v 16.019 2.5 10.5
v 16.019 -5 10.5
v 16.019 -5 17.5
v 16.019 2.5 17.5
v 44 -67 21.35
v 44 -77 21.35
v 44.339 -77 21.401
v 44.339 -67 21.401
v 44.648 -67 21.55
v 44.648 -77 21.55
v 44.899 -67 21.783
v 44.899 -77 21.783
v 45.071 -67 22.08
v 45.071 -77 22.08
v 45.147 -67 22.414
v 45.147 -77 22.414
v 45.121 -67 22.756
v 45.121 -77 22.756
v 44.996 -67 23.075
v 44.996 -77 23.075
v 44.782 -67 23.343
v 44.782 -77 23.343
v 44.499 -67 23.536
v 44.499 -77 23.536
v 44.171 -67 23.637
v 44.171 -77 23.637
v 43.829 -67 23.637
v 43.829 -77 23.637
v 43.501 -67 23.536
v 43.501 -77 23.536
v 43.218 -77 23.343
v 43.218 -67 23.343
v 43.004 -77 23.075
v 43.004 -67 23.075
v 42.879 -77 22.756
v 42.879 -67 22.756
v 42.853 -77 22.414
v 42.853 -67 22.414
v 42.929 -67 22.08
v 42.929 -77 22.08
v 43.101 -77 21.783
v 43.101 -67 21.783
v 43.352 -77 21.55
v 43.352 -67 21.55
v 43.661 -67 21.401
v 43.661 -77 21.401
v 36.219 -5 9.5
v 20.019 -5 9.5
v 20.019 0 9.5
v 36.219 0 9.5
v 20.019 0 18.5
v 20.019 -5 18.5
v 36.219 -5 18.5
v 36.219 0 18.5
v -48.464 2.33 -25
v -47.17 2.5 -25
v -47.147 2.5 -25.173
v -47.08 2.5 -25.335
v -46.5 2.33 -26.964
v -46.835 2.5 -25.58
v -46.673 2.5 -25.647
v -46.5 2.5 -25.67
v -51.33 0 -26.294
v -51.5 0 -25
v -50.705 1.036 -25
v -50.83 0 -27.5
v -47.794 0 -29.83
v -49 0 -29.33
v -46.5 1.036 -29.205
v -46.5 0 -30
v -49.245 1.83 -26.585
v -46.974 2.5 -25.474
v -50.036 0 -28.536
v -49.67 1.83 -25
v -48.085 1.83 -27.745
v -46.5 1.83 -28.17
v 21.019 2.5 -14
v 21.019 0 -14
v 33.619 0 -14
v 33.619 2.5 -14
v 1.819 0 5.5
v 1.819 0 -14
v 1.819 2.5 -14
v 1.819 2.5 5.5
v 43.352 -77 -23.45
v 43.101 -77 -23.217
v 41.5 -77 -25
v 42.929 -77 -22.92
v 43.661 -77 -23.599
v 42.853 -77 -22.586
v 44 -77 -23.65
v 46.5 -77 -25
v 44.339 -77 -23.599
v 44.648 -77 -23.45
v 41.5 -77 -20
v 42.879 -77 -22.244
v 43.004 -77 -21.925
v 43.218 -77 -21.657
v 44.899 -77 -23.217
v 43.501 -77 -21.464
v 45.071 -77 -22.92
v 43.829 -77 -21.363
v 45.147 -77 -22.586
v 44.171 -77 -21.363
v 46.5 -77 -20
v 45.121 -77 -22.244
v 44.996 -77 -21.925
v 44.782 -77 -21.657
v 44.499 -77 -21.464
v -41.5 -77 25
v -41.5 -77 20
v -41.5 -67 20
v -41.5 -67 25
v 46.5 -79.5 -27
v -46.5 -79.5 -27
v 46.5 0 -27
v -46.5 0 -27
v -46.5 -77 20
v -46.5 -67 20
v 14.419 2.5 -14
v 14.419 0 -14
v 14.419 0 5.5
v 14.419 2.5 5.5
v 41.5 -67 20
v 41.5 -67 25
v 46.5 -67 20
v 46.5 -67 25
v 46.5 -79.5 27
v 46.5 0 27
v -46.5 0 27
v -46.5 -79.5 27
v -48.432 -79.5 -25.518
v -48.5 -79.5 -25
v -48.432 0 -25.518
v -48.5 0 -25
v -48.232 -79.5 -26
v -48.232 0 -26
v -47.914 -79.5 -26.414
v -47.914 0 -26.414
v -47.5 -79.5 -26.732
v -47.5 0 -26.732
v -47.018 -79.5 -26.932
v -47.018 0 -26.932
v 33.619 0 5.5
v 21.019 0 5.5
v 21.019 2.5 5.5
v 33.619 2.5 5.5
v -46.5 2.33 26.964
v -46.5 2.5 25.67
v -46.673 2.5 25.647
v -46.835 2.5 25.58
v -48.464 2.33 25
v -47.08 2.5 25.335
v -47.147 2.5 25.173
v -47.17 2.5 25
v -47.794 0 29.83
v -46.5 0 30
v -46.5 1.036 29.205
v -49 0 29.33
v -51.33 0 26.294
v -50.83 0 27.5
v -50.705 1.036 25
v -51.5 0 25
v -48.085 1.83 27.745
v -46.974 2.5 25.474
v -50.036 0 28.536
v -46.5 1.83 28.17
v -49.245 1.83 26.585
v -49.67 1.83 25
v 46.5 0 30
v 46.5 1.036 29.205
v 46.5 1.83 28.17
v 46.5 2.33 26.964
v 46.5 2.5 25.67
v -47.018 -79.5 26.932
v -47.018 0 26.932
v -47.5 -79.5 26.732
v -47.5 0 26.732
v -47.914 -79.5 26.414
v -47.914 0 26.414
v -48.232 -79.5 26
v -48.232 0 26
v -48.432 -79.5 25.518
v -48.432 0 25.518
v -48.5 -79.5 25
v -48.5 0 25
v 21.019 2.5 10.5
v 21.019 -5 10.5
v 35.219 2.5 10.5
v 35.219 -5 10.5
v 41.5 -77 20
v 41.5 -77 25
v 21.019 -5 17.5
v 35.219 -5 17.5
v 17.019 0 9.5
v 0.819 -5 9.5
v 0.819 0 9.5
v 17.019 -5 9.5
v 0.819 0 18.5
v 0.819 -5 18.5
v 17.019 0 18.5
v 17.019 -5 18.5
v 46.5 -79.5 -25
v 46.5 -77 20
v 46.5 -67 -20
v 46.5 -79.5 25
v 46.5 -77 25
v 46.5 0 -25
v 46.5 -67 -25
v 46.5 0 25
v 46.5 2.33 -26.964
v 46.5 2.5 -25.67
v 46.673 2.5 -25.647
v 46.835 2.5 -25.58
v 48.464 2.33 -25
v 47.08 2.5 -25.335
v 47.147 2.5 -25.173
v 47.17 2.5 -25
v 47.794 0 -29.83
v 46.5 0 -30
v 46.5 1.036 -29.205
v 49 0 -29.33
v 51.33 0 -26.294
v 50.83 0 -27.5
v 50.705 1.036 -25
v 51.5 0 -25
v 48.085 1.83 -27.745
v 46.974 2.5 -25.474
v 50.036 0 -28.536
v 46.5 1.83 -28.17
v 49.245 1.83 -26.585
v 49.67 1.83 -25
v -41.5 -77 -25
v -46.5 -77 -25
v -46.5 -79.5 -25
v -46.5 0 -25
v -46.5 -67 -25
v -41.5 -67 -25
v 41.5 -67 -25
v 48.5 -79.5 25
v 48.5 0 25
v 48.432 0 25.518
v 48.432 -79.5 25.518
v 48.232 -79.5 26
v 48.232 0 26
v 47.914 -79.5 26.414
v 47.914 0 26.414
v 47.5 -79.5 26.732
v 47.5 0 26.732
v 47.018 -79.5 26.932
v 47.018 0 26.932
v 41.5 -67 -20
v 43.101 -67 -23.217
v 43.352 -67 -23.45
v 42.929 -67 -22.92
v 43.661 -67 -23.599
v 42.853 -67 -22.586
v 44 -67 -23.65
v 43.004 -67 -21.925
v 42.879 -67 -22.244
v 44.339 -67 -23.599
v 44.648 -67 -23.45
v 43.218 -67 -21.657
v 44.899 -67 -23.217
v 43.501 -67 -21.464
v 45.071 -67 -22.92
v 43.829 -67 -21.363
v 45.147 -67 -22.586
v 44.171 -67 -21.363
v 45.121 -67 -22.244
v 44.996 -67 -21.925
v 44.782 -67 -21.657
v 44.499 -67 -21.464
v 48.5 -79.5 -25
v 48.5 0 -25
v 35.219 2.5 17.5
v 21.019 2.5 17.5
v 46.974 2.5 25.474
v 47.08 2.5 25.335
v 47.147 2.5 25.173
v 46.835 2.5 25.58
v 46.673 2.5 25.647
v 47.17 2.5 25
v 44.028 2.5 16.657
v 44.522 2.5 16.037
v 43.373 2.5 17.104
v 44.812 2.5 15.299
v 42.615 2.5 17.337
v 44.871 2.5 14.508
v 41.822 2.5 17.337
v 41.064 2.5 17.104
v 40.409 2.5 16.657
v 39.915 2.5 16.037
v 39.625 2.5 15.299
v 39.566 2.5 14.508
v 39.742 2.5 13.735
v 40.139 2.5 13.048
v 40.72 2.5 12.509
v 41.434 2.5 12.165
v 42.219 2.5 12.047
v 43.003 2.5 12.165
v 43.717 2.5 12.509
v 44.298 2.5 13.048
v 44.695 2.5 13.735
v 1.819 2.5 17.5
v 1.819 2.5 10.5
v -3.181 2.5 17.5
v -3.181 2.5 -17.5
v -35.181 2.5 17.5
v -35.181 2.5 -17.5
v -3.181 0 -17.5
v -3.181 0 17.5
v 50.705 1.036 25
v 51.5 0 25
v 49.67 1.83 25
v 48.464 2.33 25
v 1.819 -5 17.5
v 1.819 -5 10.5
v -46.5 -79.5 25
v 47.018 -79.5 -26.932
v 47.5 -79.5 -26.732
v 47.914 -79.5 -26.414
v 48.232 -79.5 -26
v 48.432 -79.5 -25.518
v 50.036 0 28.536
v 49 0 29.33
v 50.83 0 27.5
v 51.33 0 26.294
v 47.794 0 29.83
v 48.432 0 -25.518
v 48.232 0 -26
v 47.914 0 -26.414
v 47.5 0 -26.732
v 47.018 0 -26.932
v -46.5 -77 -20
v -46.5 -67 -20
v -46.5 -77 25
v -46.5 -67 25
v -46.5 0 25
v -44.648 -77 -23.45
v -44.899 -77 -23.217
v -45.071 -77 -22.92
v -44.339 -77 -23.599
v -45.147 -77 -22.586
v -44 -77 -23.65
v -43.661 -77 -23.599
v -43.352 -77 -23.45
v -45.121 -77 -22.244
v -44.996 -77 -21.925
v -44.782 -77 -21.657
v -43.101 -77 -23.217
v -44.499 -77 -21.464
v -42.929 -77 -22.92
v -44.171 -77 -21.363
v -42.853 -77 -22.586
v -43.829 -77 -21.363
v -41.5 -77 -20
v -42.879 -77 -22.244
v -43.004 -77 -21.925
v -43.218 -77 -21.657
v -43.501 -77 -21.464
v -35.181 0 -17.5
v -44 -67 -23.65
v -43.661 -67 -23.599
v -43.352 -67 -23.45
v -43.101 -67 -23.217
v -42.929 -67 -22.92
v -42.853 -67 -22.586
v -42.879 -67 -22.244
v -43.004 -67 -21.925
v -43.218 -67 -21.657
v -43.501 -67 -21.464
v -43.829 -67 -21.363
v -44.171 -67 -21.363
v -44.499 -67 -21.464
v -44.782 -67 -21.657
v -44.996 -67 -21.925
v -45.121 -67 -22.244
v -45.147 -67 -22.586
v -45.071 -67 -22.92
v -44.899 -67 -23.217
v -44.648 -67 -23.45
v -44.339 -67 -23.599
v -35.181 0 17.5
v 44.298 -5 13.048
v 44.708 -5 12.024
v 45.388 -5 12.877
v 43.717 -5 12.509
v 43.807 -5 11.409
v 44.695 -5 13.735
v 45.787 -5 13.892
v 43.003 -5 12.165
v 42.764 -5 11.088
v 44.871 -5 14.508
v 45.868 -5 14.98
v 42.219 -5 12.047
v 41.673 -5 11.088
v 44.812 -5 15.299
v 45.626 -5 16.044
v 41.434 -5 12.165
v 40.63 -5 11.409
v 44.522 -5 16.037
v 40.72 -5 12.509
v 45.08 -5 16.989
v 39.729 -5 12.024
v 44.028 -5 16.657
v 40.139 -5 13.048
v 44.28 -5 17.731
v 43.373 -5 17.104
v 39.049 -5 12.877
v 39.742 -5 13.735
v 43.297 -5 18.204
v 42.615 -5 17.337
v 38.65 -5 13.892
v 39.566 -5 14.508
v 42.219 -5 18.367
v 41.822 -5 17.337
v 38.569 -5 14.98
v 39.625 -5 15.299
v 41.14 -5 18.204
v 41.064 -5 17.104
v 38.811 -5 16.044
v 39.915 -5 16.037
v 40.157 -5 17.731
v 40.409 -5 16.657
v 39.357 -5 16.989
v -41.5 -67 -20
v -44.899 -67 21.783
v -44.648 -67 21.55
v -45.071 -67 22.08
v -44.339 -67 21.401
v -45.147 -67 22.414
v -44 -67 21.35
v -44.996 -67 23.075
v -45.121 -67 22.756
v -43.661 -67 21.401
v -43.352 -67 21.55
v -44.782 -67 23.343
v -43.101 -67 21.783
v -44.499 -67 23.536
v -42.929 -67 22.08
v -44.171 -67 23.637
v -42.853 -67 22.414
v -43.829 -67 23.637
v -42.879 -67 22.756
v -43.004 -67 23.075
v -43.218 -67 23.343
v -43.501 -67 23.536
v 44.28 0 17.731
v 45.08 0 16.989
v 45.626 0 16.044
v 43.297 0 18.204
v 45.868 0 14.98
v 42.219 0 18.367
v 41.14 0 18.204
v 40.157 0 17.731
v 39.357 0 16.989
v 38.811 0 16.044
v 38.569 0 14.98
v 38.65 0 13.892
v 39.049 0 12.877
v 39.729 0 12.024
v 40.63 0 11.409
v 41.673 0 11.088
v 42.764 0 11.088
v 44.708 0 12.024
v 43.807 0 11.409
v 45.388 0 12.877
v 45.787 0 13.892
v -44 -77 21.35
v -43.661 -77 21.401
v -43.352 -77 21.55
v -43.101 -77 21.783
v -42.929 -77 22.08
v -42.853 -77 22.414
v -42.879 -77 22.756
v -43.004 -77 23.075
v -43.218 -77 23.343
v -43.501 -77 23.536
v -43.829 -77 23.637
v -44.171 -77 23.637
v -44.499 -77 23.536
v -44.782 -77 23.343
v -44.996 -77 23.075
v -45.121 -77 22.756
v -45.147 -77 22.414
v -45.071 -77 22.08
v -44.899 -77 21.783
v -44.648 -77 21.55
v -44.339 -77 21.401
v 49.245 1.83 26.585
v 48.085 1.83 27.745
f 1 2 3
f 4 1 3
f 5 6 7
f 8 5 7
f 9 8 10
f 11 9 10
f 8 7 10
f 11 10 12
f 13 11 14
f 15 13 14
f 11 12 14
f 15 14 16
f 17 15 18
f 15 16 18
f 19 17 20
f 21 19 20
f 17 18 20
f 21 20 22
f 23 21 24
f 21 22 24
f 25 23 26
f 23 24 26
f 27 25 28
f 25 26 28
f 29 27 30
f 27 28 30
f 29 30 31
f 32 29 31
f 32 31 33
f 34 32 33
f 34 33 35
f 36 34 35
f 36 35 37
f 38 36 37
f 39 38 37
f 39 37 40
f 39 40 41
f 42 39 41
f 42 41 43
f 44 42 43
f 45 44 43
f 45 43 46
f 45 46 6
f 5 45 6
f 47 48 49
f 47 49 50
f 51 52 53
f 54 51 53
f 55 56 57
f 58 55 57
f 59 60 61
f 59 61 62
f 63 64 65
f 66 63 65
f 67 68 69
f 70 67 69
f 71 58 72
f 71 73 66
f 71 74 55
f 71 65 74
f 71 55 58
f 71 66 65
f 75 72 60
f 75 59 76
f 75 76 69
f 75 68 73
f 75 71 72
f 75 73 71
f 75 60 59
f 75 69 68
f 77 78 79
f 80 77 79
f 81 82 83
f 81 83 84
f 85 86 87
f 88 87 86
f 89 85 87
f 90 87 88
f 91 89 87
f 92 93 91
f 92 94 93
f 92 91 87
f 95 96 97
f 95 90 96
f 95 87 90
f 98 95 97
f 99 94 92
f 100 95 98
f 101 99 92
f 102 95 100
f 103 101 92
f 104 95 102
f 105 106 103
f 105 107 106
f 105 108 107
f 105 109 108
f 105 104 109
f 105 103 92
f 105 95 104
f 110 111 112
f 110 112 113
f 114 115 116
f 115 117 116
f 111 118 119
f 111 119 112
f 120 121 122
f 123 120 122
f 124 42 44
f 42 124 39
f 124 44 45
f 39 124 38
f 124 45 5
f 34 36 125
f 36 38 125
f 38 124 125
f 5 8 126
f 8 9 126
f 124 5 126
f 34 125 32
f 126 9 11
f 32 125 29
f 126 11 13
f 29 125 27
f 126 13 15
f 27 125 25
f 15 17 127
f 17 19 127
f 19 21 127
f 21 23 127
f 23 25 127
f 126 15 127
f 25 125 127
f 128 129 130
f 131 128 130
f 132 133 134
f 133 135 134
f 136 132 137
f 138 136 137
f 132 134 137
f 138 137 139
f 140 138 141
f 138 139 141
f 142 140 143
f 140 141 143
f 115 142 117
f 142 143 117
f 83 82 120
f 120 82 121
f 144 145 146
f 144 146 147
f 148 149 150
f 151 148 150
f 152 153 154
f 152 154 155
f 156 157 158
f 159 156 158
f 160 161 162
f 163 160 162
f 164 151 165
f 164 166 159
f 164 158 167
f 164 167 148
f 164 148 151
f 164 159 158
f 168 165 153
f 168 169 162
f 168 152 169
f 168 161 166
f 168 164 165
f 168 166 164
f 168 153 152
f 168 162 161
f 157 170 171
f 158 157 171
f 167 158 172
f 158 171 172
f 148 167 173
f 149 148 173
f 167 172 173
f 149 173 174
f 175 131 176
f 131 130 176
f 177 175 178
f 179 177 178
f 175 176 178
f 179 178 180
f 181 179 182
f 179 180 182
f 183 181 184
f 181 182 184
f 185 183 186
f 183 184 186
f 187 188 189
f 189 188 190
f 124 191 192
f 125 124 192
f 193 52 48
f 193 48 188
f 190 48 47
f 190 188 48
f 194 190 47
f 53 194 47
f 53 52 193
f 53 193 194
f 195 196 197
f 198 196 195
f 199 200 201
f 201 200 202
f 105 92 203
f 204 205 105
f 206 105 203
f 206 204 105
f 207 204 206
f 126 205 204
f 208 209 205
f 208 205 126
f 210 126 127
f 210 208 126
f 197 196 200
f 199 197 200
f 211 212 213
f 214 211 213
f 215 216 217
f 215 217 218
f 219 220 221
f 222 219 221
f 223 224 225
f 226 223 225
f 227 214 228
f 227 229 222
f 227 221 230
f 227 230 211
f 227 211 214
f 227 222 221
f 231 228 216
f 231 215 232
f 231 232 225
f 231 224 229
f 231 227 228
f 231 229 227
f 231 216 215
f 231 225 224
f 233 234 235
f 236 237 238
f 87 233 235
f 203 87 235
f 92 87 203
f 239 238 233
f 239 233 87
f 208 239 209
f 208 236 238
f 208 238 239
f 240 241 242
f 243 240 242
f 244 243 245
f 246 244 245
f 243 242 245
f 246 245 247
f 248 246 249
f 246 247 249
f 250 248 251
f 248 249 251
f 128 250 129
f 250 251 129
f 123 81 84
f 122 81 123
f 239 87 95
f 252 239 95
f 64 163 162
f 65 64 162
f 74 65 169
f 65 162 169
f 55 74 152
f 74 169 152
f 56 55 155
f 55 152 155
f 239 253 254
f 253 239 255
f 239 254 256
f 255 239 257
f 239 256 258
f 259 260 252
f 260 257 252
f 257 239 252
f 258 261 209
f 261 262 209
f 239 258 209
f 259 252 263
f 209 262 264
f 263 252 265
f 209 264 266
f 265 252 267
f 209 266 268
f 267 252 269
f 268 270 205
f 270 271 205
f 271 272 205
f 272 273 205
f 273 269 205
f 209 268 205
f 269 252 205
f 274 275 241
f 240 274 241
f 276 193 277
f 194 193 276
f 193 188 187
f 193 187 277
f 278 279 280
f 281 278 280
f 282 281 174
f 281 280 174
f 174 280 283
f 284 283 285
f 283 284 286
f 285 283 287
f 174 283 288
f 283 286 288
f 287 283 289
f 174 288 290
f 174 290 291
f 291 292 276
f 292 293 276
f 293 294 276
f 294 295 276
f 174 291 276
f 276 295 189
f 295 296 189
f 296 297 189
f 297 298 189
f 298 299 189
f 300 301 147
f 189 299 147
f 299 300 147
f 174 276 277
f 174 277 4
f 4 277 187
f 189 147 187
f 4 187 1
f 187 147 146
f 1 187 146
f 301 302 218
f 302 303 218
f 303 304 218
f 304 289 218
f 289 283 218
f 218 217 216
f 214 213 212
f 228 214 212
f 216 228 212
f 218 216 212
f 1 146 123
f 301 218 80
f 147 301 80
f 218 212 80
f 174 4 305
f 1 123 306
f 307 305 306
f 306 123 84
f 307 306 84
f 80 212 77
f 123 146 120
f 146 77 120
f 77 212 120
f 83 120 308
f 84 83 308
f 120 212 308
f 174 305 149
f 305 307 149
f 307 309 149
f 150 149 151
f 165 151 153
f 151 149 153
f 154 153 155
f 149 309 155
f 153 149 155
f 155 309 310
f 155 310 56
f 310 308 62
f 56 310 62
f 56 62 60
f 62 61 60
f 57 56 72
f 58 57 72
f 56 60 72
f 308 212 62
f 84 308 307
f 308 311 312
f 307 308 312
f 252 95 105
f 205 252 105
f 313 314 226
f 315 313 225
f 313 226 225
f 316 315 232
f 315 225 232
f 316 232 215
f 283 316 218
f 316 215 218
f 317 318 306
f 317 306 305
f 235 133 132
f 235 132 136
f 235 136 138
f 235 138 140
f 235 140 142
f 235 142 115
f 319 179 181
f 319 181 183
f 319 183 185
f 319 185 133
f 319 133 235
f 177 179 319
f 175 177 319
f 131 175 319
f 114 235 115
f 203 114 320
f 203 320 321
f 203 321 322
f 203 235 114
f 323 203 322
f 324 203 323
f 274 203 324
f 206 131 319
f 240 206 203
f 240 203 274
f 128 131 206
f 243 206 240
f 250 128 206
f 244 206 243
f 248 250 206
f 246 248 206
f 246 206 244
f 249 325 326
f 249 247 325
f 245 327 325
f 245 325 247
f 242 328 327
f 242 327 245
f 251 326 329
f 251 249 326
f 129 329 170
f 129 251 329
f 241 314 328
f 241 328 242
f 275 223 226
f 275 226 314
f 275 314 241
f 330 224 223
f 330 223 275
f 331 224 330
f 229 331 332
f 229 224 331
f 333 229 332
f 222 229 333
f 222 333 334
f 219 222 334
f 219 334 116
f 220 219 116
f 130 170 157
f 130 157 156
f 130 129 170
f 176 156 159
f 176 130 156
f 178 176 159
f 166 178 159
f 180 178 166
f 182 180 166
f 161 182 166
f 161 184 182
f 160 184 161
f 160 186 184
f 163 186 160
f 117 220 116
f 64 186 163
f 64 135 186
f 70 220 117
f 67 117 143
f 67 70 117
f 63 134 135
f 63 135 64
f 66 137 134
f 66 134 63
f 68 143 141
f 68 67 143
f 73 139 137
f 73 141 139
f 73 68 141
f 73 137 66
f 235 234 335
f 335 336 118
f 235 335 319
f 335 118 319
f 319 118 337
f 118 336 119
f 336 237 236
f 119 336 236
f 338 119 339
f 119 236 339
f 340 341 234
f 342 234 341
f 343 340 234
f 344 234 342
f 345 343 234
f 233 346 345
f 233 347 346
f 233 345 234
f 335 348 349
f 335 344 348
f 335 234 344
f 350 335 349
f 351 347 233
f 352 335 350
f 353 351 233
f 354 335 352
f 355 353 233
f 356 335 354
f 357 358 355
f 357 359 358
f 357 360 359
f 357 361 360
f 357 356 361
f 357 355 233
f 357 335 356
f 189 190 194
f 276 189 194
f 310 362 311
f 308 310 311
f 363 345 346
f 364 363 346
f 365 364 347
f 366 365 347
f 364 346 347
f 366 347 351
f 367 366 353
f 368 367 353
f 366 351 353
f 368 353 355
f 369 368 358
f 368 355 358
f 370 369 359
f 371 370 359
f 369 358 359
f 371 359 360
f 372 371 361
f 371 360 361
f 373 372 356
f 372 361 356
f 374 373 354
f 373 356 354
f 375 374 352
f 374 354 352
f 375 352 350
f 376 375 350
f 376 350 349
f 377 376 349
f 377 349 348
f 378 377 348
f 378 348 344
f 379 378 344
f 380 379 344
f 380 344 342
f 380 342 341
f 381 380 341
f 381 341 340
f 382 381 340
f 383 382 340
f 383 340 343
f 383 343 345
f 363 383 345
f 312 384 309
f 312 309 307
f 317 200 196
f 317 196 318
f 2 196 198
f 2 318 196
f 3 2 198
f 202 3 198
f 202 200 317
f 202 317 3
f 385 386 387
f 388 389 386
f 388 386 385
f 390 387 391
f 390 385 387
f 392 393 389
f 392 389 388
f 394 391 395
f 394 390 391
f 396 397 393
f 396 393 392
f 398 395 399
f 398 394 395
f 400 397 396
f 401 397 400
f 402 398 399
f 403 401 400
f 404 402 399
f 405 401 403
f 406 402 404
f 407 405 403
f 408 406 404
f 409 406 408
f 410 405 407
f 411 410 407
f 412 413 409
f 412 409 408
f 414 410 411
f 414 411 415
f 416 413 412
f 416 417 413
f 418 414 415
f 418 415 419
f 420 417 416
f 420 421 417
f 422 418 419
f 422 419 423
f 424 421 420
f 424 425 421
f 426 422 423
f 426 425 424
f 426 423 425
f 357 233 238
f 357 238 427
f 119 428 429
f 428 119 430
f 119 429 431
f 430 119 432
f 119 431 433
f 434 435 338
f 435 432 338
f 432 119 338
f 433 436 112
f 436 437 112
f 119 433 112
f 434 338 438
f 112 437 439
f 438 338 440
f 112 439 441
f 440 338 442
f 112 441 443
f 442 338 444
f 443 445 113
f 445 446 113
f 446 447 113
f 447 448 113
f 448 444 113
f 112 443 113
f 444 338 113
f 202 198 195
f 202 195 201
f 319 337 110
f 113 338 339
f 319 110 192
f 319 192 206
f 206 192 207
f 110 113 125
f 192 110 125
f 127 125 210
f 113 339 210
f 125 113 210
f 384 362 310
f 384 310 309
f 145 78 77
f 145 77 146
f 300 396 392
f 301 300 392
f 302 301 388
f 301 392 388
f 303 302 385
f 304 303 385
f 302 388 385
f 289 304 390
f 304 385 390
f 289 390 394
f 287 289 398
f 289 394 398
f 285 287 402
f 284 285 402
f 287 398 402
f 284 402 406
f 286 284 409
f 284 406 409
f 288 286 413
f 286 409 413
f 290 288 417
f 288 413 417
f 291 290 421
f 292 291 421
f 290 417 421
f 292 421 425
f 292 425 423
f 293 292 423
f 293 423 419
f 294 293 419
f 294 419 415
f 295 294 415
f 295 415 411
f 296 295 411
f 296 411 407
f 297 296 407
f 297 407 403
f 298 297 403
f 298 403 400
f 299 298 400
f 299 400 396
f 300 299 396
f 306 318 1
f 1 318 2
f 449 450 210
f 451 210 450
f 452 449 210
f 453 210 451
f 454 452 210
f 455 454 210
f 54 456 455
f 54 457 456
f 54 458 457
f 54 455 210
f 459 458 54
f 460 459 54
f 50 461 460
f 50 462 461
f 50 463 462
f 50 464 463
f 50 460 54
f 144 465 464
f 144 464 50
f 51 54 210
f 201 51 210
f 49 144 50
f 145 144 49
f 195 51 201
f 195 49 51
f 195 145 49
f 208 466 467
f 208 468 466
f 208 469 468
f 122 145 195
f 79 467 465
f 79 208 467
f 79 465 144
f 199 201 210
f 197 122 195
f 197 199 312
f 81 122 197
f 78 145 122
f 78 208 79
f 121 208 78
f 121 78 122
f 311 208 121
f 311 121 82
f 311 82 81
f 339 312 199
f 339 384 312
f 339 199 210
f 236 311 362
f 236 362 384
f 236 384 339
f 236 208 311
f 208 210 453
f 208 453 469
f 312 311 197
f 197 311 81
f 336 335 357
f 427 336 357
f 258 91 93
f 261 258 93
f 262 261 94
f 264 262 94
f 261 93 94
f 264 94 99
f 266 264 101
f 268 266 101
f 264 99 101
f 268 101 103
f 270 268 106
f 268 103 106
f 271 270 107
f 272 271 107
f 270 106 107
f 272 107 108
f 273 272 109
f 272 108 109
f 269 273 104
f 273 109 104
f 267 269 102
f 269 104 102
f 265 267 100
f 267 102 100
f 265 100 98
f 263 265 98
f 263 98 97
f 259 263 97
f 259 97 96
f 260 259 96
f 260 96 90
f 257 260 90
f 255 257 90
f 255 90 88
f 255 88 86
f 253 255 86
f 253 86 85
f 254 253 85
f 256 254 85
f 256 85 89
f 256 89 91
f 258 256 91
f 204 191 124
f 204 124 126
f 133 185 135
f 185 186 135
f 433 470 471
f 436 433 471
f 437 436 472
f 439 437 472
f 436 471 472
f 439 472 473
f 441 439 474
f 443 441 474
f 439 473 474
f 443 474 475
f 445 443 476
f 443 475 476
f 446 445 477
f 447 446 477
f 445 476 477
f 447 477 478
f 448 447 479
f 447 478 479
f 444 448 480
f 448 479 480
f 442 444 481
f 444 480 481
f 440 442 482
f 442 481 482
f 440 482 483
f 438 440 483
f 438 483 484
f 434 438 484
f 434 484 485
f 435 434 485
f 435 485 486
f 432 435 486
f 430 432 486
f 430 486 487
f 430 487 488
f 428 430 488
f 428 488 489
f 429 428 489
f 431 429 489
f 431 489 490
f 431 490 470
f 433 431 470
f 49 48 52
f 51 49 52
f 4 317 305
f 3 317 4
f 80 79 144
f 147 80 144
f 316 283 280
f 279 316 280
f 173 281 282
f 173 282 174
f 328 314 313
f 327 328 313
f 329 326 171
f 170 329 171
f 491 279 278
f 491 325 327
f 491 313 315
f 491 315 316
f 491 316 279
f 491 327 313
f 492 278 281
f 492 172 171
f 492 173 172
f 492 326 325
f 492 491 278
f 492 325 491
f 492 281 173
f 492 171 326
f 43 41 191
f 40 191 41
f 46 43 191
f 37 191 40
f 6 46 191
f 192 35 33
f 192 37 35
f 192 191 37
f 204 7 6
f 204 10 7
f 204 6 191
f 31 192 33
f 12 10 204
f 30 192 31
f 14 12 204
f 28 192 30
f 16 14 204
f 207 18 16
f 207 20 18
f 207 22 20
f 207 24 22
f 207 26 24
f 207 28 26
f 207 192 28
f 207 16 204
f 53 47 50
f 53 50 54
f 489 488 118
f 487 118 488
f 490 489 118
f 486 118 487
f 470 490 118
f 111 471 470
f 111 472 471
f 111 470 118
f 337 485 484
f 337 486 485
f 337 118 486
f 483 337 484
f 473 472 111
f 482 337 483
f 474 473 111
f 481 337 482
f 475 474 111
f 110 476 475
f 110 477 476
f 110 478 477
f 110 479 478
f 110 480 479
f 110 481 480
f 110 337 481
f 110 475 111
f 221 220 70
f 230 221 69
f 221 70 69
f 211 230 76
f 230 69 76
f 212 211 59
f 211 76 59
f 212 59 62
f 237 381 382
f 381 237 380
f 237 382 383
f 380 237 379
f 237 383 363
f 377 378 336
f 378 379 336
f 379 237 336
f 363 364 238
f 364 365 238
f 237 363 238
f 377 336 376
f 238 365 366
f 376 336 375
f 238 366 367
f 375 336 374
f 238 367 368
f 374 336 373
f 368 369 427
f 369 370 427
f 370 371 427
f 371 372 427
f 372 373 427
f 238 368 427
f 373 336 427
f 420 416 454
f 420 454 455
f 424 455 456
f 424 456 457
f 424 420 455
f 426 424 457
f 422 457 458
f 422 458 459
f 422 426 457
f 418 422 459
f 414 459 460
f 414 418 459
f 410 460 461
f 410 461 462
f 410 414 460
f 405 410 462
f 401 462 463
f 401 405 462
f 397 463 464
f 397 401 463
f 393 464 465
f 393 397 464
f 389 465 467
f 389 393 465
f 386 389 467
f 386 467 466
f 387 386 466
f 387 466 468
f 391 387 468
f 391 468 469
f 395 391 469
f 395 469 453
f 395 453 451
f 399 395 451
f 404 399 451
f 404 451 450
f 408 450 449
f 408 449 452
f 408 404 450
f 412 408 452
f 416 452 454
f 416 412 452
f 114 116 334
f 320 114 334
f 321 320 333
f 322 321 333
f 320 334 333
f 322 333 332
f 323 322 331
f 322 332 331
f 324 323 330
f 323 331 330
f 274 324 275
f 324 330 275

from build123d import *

# Parameters (mm, degrees)
BOSS_EXTRUDE1_DEPTH = 2.5
FILLET1_R           = 5
SKETCH2_W           = 93
SKETCH2_H           = 50
BOSS_EXTRUDE2_DEPTH = 77
SKETCH8_R           = 2.660141884
SKETCH8_W           = 32
SKETCH8_H           = 35
SKETCH8_W_2         = 14.2
SKETCH8_H_2         = 7
SKETCH8_W_3         = 12.6
SKETCH8_H_3         = 19.5
CUT_EXTRUDE3_DEPTH  = 10
BOSS_EXTRUDE4_START = 5
SKETCH9_R           = 3.660141884
SKETCH9_R_2         = 2.660141884
SKETCH9_W           = 16.2
SKETCH9_H           = 9
SKETCH9_W_2         = 14.2
SKETCH9_H_2         = 7
BOSS_EXTRUDE4_DEPTH = 5
SKETCH10_W          = 5
SKETCH10_H          = 5
BOSS_EXTRUDE5_DEPTH = 10
SKETCH11_W          = 93
SKETCH11_H          = 50
BOSS_EXTRUDE6_DEPTH = 2.5
CUT_EXTRUDE4_REACH  = 101.36
SKETCH12_R          = 1.15


with BuildPart() as part:
    # Sketch1 → Boss-Extrude1 (new body)
    with BuildSketch(Plane(origin=(0, 0, 0), x_dir=(1, 0, 0), z_dir=(0, 1, 0))):
        with BuildLine():
            Line((-46.5, 30), (46.5, 30))
            ThreePointArc((46.5, 30), (50.035533906, 28.535533906), (51.5, 25))
            Line((51.5, 25), (51.5, -25))
            ThreePointArc((51.5, -25), (50.035533906, -28.535533906), (46.5, -30))
            Line((46.5, -30), (-46.5, -30))
            ThreePointArc((-46.5, -30), (-50.035533906, -28.535533906), (-51.5, -25))
            Line((-51.5, -25), (-51.5, 25))
            ThreePointArc((-51.5, 25), (-50.035533906, 28.535533906), (-46.5, 30))
        make_face()
    extrude(amount=BOSS_EXTRUDE1_DEPTH)

    # Fillet1
    # the kernel refuses this fillet: 5 mm, written as the material it takes off along each edge
    with BuildSketch(Plane(origin=(-46.5, 2.5, -25), x_dir=(-1, 0, 0), z_dir=(0, 0, 1))) as fillet1_piece_1:
        with BuildLine():
            CenterArc((0.669872981, 5), FILLET1_R, 270, 60)
            Line((0.669872981, 0), (0.669872981, -0.1))
            Line((0.669872981, -0.1), (5, -0.1))
            Line((5, -0.1), (5.1, 0))
            ThreePointArc((5.1, 0), (5.1, 1.25), (5.08660254, 2.45))
            Line((5.08660254, 2.45), (5, 2.5))
        make_face()
    revolve(axis=Axis((-46.5, 2.5, -25), (0, -1, 0)), revolution_arc=90, mode=Mode.SUBTRACT)
    with BuildSketch(Plane(origin=(-46.5, 2.5, -30), x_dir=(0, -1, 0), z_dir=(1, 0, 0)), Plane(origin=(46.5, 2.5, 30), x_dir=(0, -1, 0), z_dir=(-1, 0, 0))) as fillet1_piece_2:
        with BuildLine():
            CenterArc((5, -4.330127019), FILLET1_R, 120, 60)
            Line((0, -4.330127019), (-0.1, -4.330127019))
            Line((-0.1, -4.330127019), (-0.1, 0))
            Line((-0.1, 0), (0, 0.1))
            ThreePointArc((0, 0.1), (1.25, 0.1), (2.45, 0.08660254))
            Line((2.45, 0.08660254), (2.5, 0))
        make_face()
    extrude(amount=93, mode=Mode.SUBTRACT)
    with BuildSketch(Plane(origin=(46.5, 2.5, -25), x_dir=(0, 0, -1), z_dir=(-1, 0, 0))) as fillet1_piece_3:
        with BuildLine():
            CenterArc((0.669872981, 5), FILLET1_R, 270, 60)
            Line((0.669872981, 0), (0.669872981, -0.1))
            Line((0.669872981, -0.1), (5, -0.1))
            Line((5, -0.1), (5.1, 0))
            ThreePointArc((5.1, 0), (5.1, 1.25), (5.08660254, 2.45))
            Line((5.08660254, 2.45), (5, 2.5))
        make_face()
    revolve(axis=Axis((46.5, 2.5, -25), (0, -1, 0)), revolution_arc=90, mode=Mode.SUBTRACT)
    with BuildSketch(Plane(origin=(51.5, 2.5, -25), x_dir=(0, -1, 0), z_dir=(0, 0, 1)), Plane(origin=(-51.5, 2.5, 25), x_dir=(0, -1, 0), z_dir=(0, 0, -1))) as fillet1_piece_4:
        with BuildLine():
            CenterArc((5, -4.330127019), FILLET1_R, 120, 60)
            Line((0, -4.330127019), (-0.1, -4.330127019))
            Line((-0.1, -4.330127019), (-0.1, 0))
            Line((-0.1, 0), (0, 0.1))
            ThreePointArc((0, 0.1), (1.25, 0.1), (2.45, 0.08660254))
            Line((2.45, 0.08660254), (2.5, 0))
        make_face()
    extrude(amount=50, mode=Mode.SUBTRACT)
    with BuildSketch(Plane(origin=(46.5, 2.5, 25), x_dir=(1, 0, 0), z_dir=(0, 0, -1))) as fillet1_piece_5:
        with BuildLine():
            CenterArc((0.669872981, 5), FILLET1_R, 270, 60)
            Line((0.669872981, 0), (0.669872981, -0.1))
            Line((0.669872981, -0.1), (5, -0.1))
            Line((5, -0.1), (5.1, 0))
            ThreePointArc((5.1, 0), (5.1, 1.25), (5.08660254, 2.45))
            Line((5.08660254, 2.45), (5, 2.5))
        make_face()
    revolve(axis=Axis((46.5, 2.5, 25), (0, -1, 0)), revolution_arc=90, mode=Mode.SUBTRACT)
    with BuildSketch(Plane(origin=(-46.5, 2.5, 25), x_dir=(0, 0, 1), z_dir=(1, 0, 0))) as fillet1_piece_6:
        with BuildLine():
            CenterArc((0.669872981, 5), FILLET1_R, 270, 60)
            Line((0.669872981, 0), (0.669872981, -0.1))
            Line((0.669872981, -0.1), (5, -0.1))
            Line((5, -0.1), (5.1, 0))
            ThreePointArc((5.1, 0), (5.1, 1.25), (5.08660254, 2.45))
            Line((5.08660254, 2.45), (5, 2.5))
        make_face()
    revolve(axis=Axis((-46.5, 2.5, 25), (0, -1, 0)), revolution_arc=90, mode=Mode.SUBTRACT)

    # Sketch2 → Boss-Extrude2 (add)
    with BuildSketch(Plane.XZ):
        with BuildLine():
            Line((48.5, -25), (48.5, 25))
            ThreePointArc((48.5, 25), (47.914213562, 26.414213562), (46.5, 27))
            Line((46.5, 27), (-46.5, 27))
            ThreePointArc((-46.5, 27), (-47.914213562, 26.414213562), (-48.5, 25))
            Line((-48.5, 25), (-48.5, -25))
            ThreePointArc((-48.5, -25), (-47.914213562, -26.414213562), (-46.5, -27))
            Line((-46.5, -27), (46.5, -27))
            ThreePointArc((46.5, -27), (47.914213562, -26.414213562), (48.5, -25))
        make_face()
        Rectangle(SKETCH2_W, SKETCH2_H, mode=Mode.SUBTRACT)
    extrude(amount=BOSS_EXTRUDE2_DEPTH)

    # Sketch8 → Cut-Extrude3 (cut)
    with BuildSketch(Plane.XZ):
        with Locations(Location((42.218517518, 14.706886542, 0), (0, 0, 270))):
            Circle(SKETCH8_R)
        with Locations((-19.181482482, 0)):
            Rectangle(SKETCH8_W, SKETCH8_H)
        with Locations((8.918517518, 14)):
            Rectangle(SKETCH8_W_2, SKETCH8_H_2)
        with Locations((28.118517518, 14)):
            Rectangle(SKETCH8_W_2, SKETCH8_H_2)
        with Locations((8.118517518, -4.25)):
            Rectangle(SKETCH8_W_3, SKETCH8_H_3)
        with Locations((27.318517518, -4.25)):
            Rectangle(SKETCH8_W_3, SKETCH8_H_3)
    extrude(amount=-CUT_EXTRUDE3_DEPTH, mode=Mode.SUBTRACT)

    # Sketch9 → Boss-Extrude4 (add)
    # profile 1 of 3: a face of its own
    with BuildSketch(Plane.XZ.offset(BOSS_EXTRUDE4_START)):
        with Locations(Location((42.218517518, 14.706886542, 0), (0, 0, 90))):
            Circle(SKETCH9_R)
        with Locations(Location((42.218517518, 14.706886542, 0), (0, 0, 270))):
            Circle(SKETCH9_R_2, mode=Mode.SUBTRACT)
    # profile 2 of 3: a face of its own
    with BuildSketch(Plane.XZ.offset(BOSS_EXTRUDE4_START)):
        with Locations((8.918517518, 14)):
            Rectangle(SKETCH9_W, SKETCH9_H)
        with Locations((8.918517518, 14)):
            Rectangle(SKETCH9_W_2, SKETCH9_H_2, mode=Mode.SUBTRACT)
    # profile 3 of 3: a face of its own
    with BuildSketch(Plane.XZ.offset(BOSS_EXTRUDE4_START)):
        with Locations((28.118517518, 14)):
            Rectangle(SKETCH9_W, SKETCH9_H)
        with Locations((28.118517518, 14)):
            Rectangle(SKETCH9_W_2, SKETCH9_H_2, mode=Mode.SUBTRACT)
    extrude(amount=-BOSS_EXTRUDE4_DEPTH)

    # Sketch10 → Boss-Extrude5 (add)
    with BuildSketch(Plane.XZ.offset(77)):
        with Locations((44, 22.5)):
            Rectangle(SKETCH10_W, SKETCH10_H)
        with Locations((-44, 22.5)):
            Rectangle(SKETCH10_W, SKETCH10_H)
        with Locations((-44, -22.5)):
            Rectangle(SKETCH10_W, SKETCH10_H)
        with Locations((44, -22.5)):
            Rectangle(SKETCH10_W, SKETCH10_H)
    extrude(amount=-BOSS_EXTRUDE5_DEPTH)

    # Sketch11 → Boss-Extrude6 (add)
    with BuildSketch(Plane.XZ.offset(77)):
        with BuildLine():
            Line((46.5, 27), (-46.5, 27))
            ThreePointArc((-46.5, 27), (-47.914213562, 26.414213562), (-48.5, 25))
            Line((-48.5, 25), (-48.5, -25))
            ThreePointArc((-48.5, -25), (-47.914213562, -26.414213562), (-46.5, -27))
            Line((-46.5, -27), (46.5, -27))
            ThreePointArc((46.5, -27), (47.914213562, -26.414213562), (48.5, -25))
            Line((48.5, -25), (48.5, 25))
            ThreePointArc((48.5, 25), (47.914213562, 26.414213562), (46.5, 27))
        make_face()
        Rectangle(SKETCH11_W, SKETCH11_H, mode=Mode.SUBTRACT)
    extrude(amount=BOSS_EXTRUDE6_DEPTH)

    # Sketch12 → Cut-Extrude4 (cut, up to next)
    with BuildSketch(Plane.XZ.offset(77), mode=Mode.PRIVATE) as cut_extrude4_sk1:
        with Locations(Location((-44, 22.5, 0), (0, 0, 270))):
            Circle(SKETCH12_R)
    cut_extrude4_tool1 = extrude(cut_extrude4_sk1.sketch, amount=-CUT_EXTRUDE4_REACH, mode=Mode.PRIVATE) & part.part
    # Sketch12 → Cut-Extrude4 (cut, up to next)
    with BuildSketch(Plane.XZ.offset(77), mode=Mode.PRIVATE) as cut_extrude4_sk2:
        with Locations(Location((44, 22.5, 0), (0, 0, 270))):
            Circle(SKETCH12_R)
    cut_extrude4_tool2 = extrude(cut_extrude4_sk2.sketch, amount=-CUT_EXTRUDE4_REACH, mode=Mode.PRIVATE) & part.part
    # Sketch12 → Cut-Extrude4 (cut, up to next)
    with BuildSketch(Plane.XZ.offset(77), mode=Mode.PRIVATE) as cut_extrude4_sk3:
        with Locations(Location((44, -22.5, 0), (0, 0, 270))):
            Circle(SKETCH12_R)
    cut_extrude4_tool3 = extrude(cut_extrude4_sk3.sketch, amount=-CUT_EXTRUDE4_REACH, mode=Mode.PRIVATE) & part.part
    # Sketch12 → Cut-Extrude4 (cut, up to next)
    with BuildSketch(Plane.XZ.offset(77), mode=Mode.PRIVATE) as cut_extrude4_sk4:
        with Locations(Location((-44, -22.5, 0), (0, 0, 270))):
            Circle(SKETCH12_R)
    cut_extrude4_tool4 = extrude(cut_extrude4_sk4.sketch, amount=-CUT_EXTRUDE4_REACH, mode=Mode.PRIVATE) & part.part
    add(cut_extrude4_tool1.solids().sort_by_distance((-44, -77, 22.5))[0], mode=Mode.SUBTRACT)
    add(cut_extrude4_tool2.solids().sort_by_distance((44, -77, 22.5))[0], mode=Mode.SUBTRACT)
    add(cut_extrude4_tool3.solids().sort_by_distance((44, -77, -22.5))[0], mode=Mode.SUBTRACT)
    add(cut_extrude4_tool4.solids().sort_by_distance((-44, -77, -22.5))[0], mode=Mode.SUBTRACT)


solid = part.part
